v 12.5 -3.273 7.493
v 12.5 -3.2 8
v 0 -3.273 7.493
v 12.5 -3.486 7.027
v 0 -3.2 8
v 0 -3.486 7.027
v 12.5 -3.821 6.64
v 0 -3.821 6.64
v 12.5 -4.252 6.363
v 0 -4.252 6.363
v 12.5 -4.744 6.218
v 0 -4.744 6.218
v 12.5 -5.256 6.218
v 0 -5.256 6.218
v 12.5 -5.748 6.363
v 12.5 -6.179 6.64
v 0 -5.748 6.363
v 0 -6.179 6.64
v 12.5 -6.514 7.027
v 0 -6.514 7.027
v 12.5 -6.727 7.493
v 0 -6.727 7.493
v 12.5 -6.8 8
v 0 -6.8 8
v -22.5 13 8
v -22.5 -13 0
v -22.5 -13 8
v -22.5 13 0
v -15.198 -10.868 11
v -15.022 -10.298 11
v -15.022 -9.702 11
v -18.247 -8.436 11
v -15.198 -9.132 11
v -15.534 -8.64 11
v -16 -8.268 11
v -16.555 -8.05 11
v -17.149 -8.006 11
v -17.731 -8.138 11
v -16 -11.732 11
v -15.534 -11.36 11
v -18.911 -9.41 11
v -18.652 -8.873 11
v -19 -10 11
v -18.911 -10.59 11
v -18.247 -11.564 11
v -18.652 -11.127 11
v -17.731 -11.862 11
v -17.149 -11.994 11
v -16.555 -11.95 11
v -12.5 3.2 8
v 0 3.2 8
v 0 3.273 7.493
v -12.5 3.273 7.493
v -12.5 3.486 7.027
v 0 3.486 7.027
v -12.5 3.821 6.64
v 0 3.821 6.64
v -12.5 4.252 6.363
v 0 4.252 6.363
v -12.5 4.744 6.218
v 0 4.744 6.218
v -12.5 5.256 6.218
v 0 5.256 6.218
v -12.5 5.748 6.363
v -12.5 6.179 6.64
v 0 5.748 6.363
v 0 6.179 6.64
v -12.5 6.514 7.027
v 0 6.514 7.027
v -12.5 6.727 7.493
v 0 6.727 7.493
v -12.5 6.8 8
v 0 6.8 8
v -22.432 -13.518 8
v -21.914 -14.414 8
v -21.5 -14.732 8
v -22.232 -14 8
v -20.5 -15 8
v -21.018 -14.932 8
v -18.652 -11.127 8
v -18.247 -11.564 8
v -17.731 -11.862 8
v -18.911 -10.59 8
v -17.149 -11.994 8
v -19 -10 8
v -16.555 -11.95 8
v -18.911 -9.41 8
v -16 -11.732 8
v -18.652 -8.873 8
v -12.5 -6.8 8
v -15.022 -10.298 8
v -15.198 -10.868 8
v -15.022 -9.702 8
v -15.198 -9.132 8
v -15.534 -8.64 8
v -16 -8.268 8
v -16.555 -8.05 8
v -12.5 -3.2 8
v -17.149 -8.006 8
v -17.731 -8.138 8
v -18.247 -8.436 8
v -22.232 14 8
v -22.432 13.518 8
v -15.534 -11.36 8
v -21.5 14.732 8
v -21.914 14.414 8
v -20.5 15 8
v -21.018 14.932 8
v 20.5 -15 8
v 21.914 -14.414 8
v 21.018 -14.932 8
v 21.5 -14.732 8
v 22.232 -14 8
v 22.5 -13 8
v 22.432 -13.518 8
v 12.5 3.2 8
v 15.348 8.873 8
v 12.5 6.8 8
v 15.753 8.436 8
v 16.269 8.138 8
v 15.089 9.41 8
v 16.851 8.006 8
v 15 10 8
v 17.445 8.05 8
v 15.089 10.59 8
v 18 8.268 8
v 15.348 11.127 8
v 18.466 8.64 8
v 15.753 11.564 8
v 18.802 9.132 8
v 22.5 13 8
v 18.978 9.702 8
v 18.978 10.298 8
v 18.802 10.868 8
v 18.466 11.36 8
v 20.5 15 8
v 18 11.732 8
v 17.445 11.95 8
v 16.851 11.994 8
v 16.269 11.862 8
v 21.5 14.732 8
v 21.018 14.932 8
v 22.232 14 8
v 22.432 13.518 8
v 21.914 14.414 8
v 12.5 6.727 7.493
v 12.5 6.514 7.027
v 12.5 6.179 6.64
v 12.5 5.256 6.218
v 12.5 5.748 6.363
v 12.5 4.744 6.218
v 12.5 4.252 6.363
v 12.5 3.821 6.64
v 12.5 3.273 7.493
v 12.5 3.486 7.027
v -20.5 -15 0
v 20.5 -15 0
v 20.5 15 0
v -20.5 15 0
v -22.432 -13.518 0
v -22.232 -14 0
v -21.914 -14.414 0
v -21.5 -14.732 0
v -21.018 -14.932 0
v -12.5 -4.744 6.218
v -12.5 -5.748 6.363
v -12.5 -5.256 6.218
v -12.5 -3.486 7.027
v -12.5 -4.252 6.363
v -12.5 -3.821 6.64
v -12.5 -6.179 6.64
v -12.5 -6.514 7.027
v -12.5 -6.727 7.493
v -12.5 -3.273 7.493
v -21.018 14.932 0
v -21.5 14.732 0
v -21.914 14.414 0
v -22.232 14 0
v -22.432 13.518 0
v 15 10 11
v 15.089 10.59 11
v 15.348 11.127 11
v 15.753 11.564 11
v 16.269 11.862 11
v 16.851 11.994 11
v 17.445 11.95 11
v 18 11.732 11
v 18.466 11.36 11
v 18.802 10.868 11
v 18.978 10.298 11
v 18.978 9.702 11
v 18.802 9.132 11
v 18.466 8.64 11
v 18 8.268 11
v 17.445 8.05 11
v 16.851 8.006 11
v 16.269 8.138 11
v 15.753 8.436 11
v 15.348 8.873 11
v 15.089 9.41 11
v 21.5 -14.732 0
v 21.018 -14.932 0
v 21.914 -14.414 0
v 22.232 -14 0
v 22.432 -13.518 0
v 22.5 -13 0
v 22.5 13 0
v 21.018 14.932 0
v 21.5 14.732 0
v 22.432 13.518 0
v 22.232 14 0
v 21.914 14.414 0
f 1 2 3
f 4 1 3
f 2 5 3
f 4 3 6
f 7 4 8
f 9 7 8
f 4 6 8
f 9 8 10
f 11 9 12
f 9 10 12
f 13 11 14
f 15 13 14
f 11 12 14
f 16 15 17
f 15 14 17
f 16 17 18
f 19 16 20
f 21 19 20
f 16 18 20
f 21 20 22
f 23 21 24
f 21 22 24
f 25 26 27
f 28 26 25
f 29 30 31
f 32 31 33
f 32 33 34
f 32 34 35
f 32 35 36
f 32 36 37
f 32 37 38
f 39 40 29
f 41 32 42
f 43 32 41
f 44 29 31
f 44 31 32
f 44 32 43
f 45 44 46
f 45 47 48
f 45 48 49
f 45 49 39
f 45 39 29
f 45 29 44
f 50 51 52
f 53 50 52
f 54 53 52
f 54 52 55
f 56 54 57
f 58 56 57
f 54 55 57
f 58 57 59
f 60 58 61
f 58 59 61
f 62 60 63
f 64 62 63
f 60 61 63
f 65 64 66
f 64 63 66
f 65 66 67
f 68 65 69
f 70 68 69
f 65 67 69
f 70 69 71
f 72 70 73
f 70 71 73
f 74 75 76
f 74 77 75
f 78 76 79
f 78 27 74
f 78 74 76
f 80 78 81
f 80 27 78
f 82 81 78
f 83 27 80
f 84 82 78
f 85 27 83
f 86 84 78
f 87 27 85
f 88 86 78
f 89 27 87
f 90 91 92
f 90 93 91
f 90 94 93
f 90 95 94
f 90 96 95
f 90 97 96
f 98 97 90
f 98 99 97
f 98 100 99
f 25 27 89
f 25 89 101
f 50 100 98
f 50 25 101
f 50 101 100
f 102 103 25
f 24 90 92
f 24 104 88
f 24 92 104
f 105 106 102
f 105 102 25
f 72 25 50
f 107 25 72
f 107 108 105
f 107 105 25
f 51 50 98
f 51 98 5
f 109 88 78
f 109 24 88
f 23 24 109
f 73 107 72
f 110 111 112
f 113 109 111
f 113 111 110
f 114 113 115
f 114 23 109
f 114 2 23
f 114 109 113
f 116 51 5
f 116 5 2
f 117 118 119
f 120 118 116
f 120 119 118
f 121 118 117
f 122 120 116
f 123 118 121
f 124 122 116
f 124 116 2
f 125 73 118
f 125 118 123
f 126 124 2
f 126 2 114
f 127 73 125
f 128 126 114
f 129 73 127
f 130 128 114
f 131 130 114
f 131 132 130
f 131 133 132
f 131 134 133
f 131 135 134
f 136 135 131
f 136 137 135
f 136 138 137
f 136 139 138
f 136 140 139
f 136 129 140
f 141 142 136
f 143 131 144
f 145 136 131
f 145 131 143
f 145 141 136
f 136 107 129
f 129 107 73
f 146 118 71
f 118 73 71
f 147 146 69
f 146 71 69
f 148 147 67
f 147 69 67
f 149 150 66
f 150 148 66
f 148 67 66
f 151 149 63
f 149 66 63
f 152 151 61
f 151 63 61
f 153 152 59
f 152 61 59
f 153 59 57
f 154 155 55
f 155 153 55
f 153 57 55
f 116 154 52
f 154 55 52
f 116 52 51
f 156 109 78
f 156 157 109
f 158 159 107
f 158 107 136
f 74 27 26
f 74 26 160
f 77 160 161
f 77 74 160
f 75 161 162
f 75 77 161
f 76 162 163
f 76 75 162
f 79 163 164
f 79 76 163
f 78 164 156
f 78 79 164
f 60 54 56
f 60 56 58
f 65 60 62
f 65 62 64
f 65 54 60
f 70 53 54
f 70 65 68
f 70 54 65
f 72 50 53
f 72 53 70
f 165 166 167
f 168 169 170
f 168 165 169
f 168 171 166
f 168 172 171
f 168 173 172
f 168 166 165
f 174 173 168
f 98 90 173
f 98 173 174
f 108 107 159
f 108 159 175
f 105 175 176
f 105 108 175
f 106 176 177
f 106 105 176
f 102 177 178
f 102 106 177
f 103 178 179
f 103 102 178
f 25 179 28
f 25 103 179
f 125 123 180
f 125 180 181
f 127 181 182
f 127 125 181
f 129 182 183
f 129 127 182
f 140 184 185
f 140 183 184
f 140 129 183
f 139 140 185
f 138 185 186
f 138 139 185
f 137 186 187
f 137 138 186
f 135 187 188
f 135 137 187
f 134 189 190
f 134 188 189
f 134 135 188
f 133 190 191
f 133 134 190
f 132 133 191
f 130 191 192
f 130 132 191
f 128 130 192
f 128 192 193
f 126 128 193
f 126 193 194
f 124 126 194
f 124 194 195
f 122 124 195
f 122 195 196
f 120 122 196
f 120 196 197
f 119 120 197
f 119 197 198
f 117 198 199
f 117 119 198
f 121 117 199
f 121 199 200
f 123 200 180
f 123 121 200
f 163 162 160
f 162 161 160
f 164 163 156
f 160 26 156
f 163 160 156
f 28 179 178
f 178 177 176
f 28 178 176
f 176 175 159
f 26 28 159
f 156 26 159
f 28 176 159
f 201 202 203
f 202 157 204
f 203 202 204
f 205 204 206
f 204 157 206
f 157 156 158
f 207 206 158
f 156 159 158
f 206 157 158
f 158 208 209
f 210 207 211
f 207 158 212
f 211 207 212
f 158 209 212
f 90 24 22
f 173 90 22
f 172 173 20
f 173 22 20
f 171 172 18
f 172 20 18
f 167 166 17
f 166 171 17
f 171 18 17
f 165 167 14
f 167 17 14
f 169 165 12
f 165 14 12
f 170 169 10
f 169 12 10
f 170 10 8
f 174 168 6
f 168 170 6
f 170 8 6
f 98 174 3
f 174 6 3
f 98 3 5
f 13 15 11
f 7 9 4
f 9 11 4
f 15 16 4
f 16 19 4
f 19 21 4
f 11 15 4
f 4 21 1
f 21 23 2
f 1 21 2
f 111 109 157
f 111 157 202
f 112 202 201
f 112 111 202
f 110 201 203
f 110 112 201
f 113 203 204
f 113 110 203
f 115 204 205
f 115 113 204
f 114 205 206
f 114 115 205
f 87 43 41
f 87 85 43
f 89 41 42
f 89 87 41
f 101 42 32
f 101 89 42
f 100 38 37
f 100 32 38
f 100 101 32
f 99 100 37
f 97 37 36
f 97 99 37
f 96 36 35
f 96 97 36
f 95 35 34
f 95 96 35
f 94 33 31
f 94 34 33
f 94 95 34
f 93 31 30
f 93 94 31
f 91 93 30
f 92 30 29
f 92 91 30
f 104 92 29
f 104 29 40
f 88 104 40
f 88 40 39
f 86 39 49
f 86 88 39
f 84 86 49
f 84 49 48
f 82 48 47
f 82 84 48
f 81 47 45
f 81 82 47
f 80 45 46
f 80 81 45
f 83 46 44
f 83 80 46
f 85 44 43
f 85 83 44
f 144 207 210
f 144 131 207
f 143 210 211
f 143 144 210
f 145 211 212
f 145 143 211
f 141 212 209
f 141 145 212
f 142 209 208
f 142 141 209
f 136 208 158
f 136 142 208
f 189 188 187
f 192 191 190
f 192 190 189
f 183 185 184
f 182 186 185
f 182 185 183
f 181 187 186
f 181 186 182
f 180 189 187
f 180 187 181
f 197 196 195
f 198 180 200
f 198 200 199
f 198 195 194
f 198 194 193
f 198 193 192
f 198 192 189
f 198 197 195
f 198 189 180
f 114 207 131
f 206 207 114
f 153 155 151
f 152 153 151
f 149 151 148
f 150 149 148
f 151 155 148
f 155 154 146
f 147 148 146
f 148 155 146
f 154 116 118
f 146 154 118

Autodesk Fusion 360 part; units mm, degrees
sketch "草图1" plane through (0, 0, 0) normal (0, 0, 1) x (1, 0, 0)
  line L0 (22.5, -15) -> (-22.5, -15)
  line L1 (-22.5, -15) -> (-22.5, 15)
  line L2 (-22.5, 15) -> (22.5, 15)
  line L3 (22.5, 15) -> (22.5, -15)
  line L4 (22.5, -15) -> (-22.5, 15) construction
  line L5 (-22.5, -15) -> (22.5, 15) construction
  dimension "d27" = 45
  dimension "d28" = 30
extrude "拉伸1" add sketch "草图1" along normal blind 8
sketch "草图2" plane through (0, 0, 0) normal (1, 0, 0) x (0, 1, 0)
  circle A0 centre (5, 8) radius 1.8
  dimension "d31" = 3.6
extrude "拉伸2" cut sketch "草图2" along normal blind 12.5 and the other way blind 12.5
mirror "镜像1" about plane through (0, 0, 0) normal (0, 1, 0) of "拉伸2"
sketch "草图3" plane through (0, 0, 8) normal (0, 0, 1) x (-1, 0, 0)
  line L0 (12.5, 6.8) -> (12.5, 3.2)
  line L1 (12.5, 3.2) -> (-12.5, 3.2)
  line L2 (-12.5, 3.2) -> (-12.5, 6.8)
  line L3 (-12.5, 6.8) -> (12.5, 6.8)
  line L4 (12.5, -3.2) -> (12.5, -6.8)
  line L5 (12.5, -6.8) -> (-12.5, -6.8)
  line L6 (-12.5, -6.8) -> (-12.5, -3.2)
  line L7 (-12.5, -3.2) -> (12.5, -3.2)
  line L8 (-22.5, -15) -> (22.5, -15)
  line L9 (22.5, -15) -> (22.5, 15)
  line L10 (22.5, 15) -> (-22.5, 15)
  line L11 (-22.5, 15) -> (-22.5, -15)
  circle A0 centre (17, 10) radius 2
  circle A1 centre (-17, -10) radius 2
  dimension "d38" = 4
  dimension "d39" = 4
extrude "拉伸3" add sketch "草图3" along normal blind 3 contours A0 | A1
fillet "圆角1" radius 2 4 edges at (-22.5, -15, 4) (-22.5, 15, 4) (22.5, 15, 4) (22.5, -15, 4)
equation "Catheter_Diameter = 2.4 mm" comment "Flexible spring catheter outer diameter"
equation "Catheter_Assembly_Clearance = 0.2 mm" comment "Initial diametral assembly clearance between catheter and Ecoflex liner"
equation "Clamp_Groove_Diameter = 3.6 mm" comment "Hard clamp circular groove diameter"
equation "Pad_Outer_Diameter = Clamp_Groove_Diameter" comment "Ecoflex liner outer diameter driven by clamp groove"
equation "Pad_Outer_Radius = Pad_Outer_Diameter / 2" comment "Ecoflex liner outer radius"
equation "Pad_Inner_Diameter = Catheter_Diameter + Catheter_Assembly_Clearance" comment "Ecoflex liner inner diameter"
equation "Pad_Inner_Radius = Pad_Inner_Diameter / 2" comment "Ecoflex liner inner radius"
equation "Pad_Radial_Thickness = ( Pad_Outer_Diameter - Pad_Inner_Diameter ) / 2" comment "Nominal radial thickness of Ecoflex liner"
equation "Pad_Length = 25 mm" comment "Effective Ecoflex liner length"
equation "Mold_Length = 45 mm" comment "Overall mold length along X"
equation "Mold_Width = 30 mm" comment "Overall mold width along Y"
equation "Bottom_Mold_Thickness = 8 mm" comment "Bottom mold plate thickness"
equation "Top_Mold_Thickness = 6 mm" comment "Top mold plate thickness"
equation "Top_Mold_Base_Z = Bottom_Mold_Thickness" comment "Assembly Z height of top mold bottom parting face"
equation "Pad_Cavity_Offset_Y = 5 mm" comment "Centerline offset of the two cavities from mold center"
equation "Alignment_Pin_Diameter = 4 mm" comment "Printed alignment pin diameter on bottom mold"
equation "Alignment_Pin_Height = 3 mm" comment "Alignment pin height"
equation "Alignment_Hole_Diameter = 4.4 mm" comment "Alignment blind-hole diameter on top mold"
equation "Alignment_Hole_Depth = 3.4 mm" comment "Alignment blind-hole depth"
equation "Alignment_Pin_Offset_X = 17 mm" comment "Absolute X coordinate magnitude of alignment pins"
equation "Alignment_Pin_Offset_Y = 10 mm" comment "Absolute Y coordinate magnitude of alignment pins"
equation "Overflow_Channel_Width = 1 mm" comment "Optional V1 overflow-channel width; retained but not used in recommended V1"
equation "Overflow_Channel_Depth = 0.4 mm" comment "Optional V1 overflow-channel depth; retained but not used in recommended V1"
equation "Overflow_Well_Diameter = 6 mm" comment "Optional overflow-well diameter; retained but not used in recommended V1"
equation "Overflow_Well_Depth = 1 mm" comment "Optional overflow-well depth; retained but not used in recommended V1"
equation "Mold_Outer_Fillet = 2 mm" comment "External handling-edge fillet radius"
equation "d27 = Mold_Length"
equation "d28 = Mold_Width"
equation "d29 = Bottom_Mold_Thickness"
equation "d31 = Pad_Outer_Diameter"
equation "d32 = Pad_Length / 2"
equation "d34 = Pad_Length / 2"
equation "d38 = Alignment_Pin_Diameter"
equation "d43 = Mold_Outer_Fillet"
